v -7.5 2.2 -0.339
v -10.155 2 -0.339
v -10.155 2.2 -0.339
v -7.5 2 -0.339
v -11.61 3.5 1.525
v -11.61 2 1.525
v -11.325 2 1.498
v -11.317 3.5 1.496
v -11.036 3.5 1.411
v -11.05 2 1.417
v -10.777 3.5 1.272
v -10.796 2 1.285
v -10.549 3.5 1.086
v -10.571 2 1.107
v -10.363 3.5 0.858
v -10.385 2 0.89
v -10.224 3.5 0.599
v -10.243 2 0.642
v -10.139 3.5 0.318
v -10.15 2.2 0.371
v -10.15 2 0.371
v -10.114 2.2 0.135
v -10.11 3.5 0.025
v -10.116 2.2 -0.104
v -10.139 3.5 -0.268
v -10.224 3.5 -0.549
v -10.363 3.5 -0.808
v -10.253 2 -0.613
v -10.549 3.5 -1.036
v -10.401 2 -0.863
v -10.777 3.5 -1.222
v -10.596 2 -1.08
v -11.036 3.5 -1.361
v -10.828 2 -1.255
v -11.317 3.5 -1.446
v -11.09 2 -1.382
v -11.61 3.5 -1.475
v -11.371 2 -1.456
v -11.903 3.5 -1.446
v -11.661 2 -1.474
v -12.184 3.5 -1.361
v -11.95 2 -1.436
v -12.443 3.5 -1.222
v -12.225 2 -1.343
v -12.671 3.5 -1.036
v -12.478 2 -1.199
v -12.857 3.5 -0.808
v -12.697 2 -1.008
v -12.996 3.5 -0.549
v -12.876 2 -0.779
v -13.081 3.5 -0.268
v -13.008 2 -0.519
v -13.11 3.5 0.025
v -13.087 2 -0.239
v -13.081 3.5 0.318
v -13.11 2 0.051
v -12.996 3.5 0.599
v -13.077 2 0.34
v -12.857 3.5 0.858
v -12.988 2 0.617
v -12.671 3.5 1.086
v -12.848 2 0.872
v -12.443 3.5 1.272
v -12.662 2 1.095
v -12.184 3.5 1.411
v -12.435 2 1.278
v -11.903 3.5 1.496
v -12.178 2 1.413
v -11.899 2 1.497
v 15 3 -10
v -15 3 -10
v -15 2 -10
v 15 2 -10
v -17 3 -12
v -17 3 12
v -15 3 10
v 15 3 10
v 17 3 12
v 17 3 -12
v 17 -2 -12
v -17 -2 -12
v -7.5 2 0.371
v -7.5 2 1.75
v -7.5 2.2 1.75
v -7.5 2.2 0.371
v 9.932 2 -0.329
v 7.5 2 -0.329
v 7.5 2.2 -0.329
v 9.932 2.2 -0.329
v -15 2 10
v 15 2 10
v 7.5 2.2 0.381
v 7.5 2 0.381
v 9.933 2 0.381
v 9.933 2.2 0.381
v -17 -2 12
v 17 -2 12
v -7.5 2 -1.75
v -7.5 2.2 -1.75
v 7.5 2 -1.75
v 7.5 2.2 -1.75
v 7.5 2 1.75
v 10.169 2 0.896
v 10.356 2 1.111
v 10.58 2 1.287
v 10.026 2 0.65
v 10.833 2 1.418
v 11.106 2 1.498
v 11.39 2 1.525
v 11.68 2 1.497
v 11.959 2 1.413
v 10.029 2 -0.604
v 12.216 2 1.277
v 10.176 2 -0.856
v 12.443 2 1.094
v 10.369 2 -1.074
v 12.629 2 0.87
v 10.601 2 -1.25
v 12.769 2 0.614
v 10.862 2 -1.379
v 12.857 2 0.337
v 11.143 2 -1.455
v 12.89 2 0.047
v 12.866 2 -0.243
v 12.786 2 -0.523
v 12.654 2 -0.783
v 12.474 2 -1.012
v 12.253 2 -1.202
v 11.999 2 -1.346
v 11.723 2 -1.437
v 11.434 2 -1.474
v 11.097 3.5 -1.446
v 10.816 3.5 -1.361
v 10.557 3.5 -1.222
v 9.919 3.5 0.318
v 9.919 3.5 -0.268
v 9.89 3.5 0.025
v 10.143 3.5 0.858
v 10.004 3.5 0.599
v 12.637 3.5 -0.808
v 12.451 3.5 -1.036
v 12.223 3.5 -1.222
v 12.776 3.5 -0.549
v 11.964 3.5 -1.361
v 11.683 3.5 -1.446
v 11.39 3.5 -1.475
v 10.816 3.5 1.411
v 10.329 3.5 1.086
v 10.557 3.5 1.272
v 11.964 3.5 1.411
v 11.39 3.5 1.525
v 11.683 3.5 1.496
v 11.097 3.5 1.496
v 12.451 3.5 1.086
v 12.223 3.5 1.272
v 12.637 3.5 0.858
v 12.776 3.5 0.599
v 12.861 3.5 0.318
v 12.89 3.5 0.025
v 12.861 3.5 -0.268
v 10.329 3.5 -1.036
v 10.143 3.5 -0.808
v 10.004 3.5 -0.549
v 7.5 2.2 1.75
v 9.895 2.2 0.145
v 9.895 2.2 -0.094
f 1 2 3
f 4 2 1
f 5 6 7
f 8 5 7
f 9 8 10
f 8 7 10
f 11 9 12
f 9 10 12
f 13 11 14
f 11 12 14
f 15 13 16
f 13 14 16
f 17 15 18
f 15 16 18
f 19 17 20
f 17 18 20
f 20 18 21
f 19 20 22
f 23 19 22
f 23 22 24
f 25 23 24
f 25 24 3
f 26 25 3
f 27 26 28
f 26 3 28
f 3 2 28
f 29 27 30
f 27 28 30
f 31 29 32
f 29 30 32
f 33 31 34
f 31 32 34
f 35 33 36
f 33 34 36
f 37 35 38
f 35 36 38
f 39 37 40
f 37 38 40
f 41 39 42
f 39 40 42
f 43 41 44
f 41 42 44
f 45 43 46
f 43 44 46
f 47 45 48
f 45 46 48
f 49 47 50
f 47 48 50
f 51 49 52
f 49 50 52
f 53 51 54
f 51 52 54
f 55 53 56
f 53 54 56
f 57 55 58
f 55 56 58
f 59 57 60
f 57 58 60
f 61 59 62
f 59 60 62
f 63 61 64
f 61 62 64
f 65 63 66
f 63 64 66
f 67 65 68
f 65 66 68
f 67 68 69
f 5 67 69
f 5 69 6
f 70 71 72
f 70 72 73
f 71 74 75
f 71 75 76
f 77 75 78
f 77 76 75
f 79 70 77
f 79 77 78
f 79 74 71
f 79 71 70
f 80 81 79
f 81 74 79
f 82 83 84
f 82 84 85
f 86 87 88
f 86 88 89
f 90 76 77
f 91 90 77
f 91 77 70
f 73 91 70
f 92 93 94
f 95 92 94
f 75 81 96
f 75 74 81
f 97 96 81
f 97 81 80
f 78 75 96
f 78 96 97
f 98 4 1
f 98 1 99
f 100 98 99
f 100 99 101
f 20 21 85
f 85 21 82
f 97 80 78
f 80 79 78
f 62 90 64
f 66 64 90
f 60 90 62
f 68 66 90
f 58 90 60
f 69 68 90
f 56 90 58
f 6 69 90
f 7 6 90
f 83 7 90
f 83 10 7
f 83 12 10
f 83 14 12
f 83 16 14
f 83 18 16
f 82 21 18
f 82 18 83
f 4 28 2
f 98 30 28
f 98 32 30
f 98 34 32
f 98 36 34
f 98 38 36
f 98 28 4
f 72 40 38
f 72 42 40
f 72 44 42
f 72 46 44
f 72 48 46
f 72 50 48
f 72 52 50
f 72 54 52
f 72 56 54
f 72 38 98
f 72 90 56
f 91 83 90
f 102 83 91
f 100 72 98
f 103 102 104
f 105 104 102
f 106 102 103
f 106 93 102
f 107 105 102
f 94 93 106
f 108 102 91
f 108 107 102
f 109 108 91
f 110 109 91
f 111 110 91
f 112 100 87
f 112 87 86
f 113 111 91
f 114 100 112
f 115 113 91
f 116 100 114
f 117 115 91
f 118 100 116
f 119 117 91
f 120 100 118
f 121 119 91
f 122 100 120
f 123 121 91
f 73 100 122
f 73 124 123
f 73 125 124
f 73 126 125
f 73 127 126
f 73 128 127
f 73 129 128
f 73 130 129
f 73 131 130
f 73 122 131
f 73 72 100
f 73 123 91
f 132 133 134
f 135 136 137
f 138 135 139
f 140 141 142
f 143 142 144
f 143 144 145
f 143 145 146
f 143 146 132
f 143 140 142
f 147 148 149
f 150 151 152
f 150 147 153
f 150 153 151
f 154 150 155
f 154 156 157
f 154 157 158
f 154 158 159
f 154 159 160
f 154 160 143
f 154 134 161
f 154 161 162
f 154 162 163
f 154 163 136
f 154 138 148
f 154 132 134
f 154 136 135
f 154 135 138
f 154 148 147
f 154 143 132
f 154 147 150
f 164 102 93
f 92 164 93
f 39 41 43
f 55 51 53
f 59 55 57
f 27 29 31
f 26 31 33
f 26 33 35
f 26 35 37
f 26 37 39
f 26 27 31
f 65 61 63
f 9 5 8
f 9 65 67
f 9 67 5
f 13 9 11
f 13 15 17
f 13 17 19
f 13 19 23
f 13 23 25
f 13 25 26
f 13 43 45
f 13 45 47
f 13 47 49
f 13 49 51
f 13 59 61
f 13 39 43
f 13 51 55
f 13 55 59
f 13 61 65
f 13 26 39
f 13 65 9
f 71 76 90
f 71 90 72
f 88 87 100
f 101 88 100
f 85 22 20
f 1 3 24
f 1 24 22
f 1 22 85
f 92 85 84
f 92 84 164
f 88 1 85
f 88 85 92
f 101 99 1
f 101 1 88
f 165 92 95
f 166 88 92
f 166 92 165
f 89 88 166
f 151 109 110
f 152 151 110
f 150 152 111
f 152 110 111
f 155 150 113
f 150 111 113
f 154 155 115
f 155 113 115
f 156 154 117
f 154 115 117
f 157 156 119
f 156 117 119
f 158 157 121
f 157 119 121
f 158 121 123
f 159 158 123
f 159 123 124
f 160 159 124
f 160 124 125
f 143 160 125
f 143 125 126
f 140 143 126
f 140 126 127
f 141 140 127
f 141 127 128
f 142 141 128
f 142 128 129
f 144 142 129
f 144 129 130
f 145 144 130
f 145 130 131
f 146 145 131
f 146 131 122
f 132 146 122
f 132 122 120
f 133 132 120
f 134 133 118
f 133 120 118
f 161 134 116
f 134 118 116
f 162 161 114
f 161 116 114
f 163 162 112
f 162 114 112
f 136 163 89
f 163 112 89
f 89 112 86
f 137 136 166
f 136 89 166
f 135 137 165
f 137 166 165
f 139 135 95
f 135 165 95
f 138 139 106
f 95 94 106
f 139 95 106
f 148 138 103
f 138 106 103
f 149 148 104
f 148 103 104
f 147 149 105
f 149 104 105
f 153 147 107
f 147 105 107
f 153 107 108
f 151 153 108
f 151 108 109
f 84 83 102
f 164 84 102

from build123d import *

# Parameters (mm, degrees)
CROQUIS1_W               = 34
CROQUIS1_H               = 24
SALIENTE_EXTRUIR1_DEPTH  = 3
CROQUIS2_W               = 30
CROQUIS2_H               = 20
CORTAR_EXTRUIR1_DEPTH    = 1
CROQUIS6_R               = 1.5
SALIENTE_EXTRUIR3_DEPTH  = 1.5
MATRIZL1_COUNT           = 2
MATRIZL1_PITCH           = 23
CROQUIS8_W               = 5
CROQUIS8_H               = 0.71
SALIENTE_EXTRUIR5_DEPTH  = 0.2
CROQUIS10_W              = 5
CROQUIS10_H              = 0.71
SALIENTE_EXTRUIR6_DEPTH  = 0.2
CROQUIS18_W              = 15
CROQUIS18_H              = 3.5
SALIENTE_EXTRUIR8_DEPTH  = 0.2
CROQUIS23_W              = 34
CROQUIS23_H              = 24
SALIENTE_EXTRUIR11_DEPTH = 2


with BuildPart() as part:
    # Croquis1 → Saliente-Extruir1 (new body)
    with BuildSketch(Plane(origin=(0, 0, 0), x_dir=(1, 0, 0), z_dir=(0, 1, 0))):
        Rectangle(CROQUIS1_W, CROQUIS1_H)
    extrude(amount=SALIENTE_EXTRUIR1_DEPTH)

    # Croquis2 → Cortar-Extruir1 (cut)
    with BuildSketch(Plane(origin=(0, 3, 0), x_dir=(1, 0, 0), z_dir=(0, 1, 0))):
        Rectangle(CROQUIS2_W, CROQUIS2_H)
    extrude(amount=-CORTAR_EXTRUIR1_DEPTH, mode=Mode.SUBTRACT)

    # Croquis6 → Saliente-Extruir3 (add)
    with BuildSketch(Plane(origin=(-1.755264317, 2, -0.109917309), x_dir=(1, 0, 0), z_dir=(0, 1, 0))):
        with Locations(Location((-9.854739848, -0.135008356, 0), (0, 0, 270))):
            Circle(CROQUIS6_R)
    saliente_extruir3 = extrude(amount=SALIENTE_EXTRUIR3_DEPTH)

    # MatrizL1: Saliente-Extruir3 ×2
    with Locations(*[(i * MATRIZL1_PITCH, 0, 0) for i in range(1, MATRIZL1_COUNT)]):
        add(saliente_extruir3)

    # Croquis8 → Saliente-Extruir5 (add)
    with BuildSketch(Plane(origin=(0, 2, 0.512947444), x_dir=(1, 0, 0), z_dir=(0, 1, 0))):
        with Locations((-9.175591951, 0.49731844)):
            Rectangle(CROQUIS8_W, CROQUIS8_H)
    extrude(amount=SALIENTE_EXTRUIR5_DEPTH)

    # Croquis10 → Saliente-Extruir6 (add)
    with BuildSketch(Plane(origin=(3.639202125, 2, -0.512947444), x_dir=(1, 0, 0), z_dir=(0, 1, 0))):
        with Locations((5.490278272, -0.538512576)):
            Rectangle(CROQUIS10_W, CROQUIS10_H)
    extrude(amount=SALIENTE_EXTRUIR6_DEPTH)

    # Croquis18 → Saliente-Extruir8 (add)
    with BuildSketch(Plane(origin=(0, 2, 0), x_dir=(1, 0, 0), z_dir=(0, 1, 0))):
        Rectangle(CROQUIS18_W, CROQUIS18_H)
    extrude(amount=SALIENTE_EXTRUIR8_DEPTH)

    # Croquis23 → Saliente-Extruir11 (add)
    with BuildSketch(Plane.XZ):
        Rectangle(CROQUIS23_W, CROQUIS23_H)
    extrude(amount=SALIENTE_EXTRUIR11_DEPTH)


solid = part.part
